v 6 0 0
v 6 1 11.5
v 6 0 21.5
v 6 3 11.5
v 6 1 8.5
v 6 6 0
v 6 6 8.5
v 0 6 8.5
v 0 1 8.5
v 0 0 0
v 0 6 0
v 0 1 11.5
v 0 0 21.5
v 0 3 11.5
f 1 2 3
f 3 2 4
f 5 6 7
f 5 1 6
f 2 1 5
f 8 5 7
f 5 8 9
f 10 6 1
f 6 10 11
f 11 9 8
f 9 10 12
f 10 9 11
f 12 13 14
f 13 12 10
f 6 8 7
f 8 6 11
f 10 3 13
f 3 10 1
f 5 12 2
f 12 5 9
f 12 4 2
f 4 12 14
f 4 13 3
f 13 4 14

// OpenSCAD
//snap_holder_newboard();
//cube([50, 6, 3], center=true);
//translate([0,0,0])
//cube([6, 23, 3], center=true);

snap_arm(stand_height=8.5,shrink_factor=0);

module snap_arm(stand_height=10, lip_height=3, length=6, shrink_factor=0){
        cube([length-shrink_factor,6-shrink_factor,stand_height]);
        cube([length-shrink_factor,1,stand_height+lip_height+2]);
        translate([0,0,stand_height+lip_height])
        rotate([90,0,90])
        linear_extrude(length-shrink_factor)
        polygon([[0,0], [0,10], [3,0]]);
    }

module snap_holder_newboard(){
    
    
    
    translate([-3,-59.25/2-2,-1.5])
    snap_arm();
    translate([3,+59.25/2+2,-1.5])
    rotate([0,0,180])
    snap_arm();
    
    translate([56.25/2+2,-3+7,-1.5])
    rotate([0,0,90])
    snap_arm();
    translate([-56.25/2-2,3+7,-1.5])
    rotate([0,0,270])
    snap_arm();
    /*
    translate([107/2+3,-3,-1.5])
    rotate([0,0,90])
    snap_arm();
    
    translate([-107/2-3,3,-1.5])
    rotate([0,0,-90])
    snap_arm();
    */
}
